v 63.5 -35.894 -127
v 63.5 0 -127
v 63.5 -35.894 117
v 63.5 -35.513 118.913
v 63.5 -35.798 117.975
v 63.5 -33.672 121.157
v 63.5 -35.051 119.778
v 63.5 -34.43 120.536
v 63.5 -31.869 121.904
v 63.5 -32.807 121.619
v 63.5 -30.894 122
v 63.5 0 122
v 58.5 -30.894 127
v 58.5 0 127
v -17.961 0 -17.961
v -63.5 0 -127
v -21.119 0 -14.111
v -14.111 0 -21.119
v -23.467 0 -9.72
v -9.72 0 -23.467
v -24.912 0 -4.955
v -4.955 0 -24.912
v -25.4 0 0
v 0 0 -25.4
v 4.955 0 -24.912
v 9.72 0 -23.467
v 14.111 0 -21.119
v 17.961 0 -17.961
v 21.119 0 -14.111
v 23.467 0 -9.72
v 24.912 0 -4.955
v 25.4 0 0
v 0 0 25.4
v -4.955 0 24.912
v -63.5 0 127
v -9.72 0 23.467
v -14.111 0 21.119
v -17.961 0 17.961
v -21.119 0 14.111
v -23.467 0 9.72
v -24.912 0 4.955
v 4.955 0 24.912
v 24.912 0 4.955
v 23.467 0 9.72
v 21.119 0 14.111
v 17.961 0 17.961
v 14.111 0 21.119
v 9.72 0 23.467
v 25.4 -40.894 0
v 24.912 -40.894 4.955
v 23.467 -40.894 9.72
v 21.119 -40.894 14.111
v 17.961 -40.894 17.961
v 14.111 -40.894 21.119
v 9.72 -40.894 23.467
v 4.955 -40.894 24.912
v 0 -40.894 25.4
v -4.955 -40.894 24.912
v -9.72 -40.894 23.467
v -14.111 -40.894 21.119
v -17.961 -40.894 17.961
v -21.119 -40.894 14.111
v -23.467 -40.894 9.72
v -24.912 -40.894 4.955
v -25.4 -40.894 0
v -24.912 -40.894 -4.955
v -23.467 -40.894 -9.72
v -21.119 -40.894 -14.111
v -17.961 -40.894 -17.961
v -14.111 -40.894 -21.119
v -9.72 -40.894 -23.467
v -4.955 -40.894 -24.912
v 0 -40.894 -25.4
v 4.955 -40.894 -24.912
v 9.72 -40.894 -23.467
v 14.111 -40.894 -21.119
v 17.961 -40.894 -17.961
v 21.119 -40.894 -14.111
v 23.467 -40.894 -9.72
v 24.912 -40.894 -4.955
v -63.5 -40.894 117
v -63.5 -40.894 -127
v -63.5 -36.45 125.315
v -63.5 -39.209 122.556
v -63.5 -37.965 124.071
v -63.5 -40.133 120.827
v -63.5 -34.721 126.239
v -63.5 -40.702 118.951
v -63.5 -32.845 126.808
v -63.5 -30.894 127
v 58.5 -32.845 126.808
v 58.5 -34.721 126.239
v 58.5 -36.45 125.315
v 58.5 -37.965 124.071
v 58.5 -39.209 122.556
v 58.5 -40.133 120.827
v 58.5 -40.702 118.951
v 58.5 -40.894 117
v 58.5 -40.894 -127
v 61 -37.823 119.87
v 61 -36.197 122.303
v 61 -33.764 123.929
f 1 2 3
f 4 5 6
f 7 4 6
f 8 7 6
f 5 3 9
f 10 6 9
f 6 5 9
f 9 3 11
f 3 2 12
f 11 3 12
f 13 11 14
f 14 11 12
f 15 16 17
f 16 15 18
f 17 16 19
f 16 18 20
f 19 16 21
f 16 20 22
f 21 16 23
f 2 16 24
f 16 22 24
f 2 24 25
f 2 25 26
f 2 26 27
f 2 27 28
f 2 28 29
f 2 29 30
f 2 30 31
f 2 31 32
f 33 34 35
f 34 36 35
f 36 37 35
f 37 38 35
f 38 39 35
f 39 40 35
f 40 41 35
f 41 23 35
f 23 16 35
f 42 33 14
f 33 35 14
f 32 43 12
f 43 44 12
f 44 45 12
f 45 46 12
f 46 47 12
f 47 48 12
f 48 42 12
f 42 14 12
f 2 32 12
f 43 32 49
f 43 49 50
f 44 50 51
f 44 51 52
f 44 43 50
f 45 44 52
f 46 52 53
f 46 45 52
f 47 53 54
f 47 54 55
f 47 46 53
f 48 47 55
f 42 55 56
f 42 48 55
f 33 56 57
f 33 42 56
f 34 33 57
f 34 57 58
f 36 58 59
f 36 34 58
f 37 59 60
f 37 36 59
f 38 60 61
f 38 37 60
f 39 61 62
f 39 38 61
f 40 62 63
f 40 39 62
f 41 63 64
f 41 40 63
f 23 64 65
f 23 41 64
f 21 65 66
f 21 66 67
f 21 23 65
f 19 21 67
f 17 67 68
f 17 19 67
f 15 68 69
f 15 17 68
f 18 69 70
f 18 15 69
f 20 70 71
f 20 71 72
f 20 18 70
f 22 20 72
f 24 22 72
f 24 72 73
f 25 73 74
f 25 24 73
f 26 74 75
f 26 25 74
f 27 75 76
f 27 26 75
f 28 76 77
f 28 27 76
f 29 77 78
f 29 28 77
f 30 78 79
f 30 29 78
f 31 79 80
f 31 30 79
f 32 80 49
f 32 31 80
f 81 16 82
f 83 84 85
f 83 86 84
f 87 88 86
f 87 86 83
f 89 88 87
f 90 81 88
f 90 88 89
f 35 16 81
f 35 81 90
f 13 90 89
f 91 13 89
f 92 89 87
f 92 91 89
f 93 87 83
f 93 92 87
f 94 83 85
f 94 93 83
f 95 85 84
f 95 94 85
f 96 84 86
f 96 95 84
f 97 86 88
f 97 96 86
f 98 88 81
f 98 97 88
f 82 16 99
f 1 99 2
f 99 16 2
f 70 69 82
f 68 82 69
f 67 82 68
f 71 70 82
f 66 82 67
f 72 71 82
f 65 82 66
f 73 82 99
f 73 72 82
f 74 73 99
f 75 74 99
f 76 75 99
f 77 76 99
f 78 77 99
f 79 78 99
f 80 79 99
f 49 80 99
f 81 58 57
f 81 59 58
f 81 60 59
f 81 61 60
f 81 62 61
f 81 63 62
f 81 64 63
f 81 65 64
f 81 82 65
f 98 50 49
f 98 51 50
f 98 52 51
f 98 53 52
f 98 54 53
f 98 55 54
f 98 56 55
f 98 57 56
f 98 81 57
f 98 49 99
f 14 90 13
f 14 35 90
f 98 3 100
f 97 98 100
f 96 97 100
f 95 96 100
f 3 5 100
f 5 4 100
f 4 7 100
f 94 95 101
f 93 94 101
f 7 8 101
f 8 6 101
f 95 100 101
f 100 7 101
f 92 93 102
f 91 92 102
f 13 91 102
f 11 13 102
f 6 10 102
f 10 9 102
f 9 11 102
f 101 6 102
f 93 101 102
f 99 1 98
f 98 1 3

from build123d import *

# Parameters (mm, degrees)
F0_W     = 127
F0_H     = 254
F0_R     = 25.4
F1_DEPTH = 40.894
F2_R     = 10
F3_SIZE  = 5


with BuildPart() as f1:
    # F0 (on Front) → F1 (new body)
    with BuildSketch(Plane.XZ):
        Rectangle(F0_W, F0_H)
        Circle(F0_R, mode=Mode.SUBTRACT)
    extrude(amount=F1_DEPTH)

    # F2
    f2_edges = [f1.edges().sort_by_distance(p)[0] for p in [
        (0, -40.894, 127),
    ]]
    fillet(f2_edges, radius=F2_R)

    # F3
    f3_edges = [f1.edges().sort_by_distance(p)[0] for p in [
        (63.5, -40.894, -5),
    ]]
    chamfer(f3_edges, length=F3_SIZE)


solid = f1.part
